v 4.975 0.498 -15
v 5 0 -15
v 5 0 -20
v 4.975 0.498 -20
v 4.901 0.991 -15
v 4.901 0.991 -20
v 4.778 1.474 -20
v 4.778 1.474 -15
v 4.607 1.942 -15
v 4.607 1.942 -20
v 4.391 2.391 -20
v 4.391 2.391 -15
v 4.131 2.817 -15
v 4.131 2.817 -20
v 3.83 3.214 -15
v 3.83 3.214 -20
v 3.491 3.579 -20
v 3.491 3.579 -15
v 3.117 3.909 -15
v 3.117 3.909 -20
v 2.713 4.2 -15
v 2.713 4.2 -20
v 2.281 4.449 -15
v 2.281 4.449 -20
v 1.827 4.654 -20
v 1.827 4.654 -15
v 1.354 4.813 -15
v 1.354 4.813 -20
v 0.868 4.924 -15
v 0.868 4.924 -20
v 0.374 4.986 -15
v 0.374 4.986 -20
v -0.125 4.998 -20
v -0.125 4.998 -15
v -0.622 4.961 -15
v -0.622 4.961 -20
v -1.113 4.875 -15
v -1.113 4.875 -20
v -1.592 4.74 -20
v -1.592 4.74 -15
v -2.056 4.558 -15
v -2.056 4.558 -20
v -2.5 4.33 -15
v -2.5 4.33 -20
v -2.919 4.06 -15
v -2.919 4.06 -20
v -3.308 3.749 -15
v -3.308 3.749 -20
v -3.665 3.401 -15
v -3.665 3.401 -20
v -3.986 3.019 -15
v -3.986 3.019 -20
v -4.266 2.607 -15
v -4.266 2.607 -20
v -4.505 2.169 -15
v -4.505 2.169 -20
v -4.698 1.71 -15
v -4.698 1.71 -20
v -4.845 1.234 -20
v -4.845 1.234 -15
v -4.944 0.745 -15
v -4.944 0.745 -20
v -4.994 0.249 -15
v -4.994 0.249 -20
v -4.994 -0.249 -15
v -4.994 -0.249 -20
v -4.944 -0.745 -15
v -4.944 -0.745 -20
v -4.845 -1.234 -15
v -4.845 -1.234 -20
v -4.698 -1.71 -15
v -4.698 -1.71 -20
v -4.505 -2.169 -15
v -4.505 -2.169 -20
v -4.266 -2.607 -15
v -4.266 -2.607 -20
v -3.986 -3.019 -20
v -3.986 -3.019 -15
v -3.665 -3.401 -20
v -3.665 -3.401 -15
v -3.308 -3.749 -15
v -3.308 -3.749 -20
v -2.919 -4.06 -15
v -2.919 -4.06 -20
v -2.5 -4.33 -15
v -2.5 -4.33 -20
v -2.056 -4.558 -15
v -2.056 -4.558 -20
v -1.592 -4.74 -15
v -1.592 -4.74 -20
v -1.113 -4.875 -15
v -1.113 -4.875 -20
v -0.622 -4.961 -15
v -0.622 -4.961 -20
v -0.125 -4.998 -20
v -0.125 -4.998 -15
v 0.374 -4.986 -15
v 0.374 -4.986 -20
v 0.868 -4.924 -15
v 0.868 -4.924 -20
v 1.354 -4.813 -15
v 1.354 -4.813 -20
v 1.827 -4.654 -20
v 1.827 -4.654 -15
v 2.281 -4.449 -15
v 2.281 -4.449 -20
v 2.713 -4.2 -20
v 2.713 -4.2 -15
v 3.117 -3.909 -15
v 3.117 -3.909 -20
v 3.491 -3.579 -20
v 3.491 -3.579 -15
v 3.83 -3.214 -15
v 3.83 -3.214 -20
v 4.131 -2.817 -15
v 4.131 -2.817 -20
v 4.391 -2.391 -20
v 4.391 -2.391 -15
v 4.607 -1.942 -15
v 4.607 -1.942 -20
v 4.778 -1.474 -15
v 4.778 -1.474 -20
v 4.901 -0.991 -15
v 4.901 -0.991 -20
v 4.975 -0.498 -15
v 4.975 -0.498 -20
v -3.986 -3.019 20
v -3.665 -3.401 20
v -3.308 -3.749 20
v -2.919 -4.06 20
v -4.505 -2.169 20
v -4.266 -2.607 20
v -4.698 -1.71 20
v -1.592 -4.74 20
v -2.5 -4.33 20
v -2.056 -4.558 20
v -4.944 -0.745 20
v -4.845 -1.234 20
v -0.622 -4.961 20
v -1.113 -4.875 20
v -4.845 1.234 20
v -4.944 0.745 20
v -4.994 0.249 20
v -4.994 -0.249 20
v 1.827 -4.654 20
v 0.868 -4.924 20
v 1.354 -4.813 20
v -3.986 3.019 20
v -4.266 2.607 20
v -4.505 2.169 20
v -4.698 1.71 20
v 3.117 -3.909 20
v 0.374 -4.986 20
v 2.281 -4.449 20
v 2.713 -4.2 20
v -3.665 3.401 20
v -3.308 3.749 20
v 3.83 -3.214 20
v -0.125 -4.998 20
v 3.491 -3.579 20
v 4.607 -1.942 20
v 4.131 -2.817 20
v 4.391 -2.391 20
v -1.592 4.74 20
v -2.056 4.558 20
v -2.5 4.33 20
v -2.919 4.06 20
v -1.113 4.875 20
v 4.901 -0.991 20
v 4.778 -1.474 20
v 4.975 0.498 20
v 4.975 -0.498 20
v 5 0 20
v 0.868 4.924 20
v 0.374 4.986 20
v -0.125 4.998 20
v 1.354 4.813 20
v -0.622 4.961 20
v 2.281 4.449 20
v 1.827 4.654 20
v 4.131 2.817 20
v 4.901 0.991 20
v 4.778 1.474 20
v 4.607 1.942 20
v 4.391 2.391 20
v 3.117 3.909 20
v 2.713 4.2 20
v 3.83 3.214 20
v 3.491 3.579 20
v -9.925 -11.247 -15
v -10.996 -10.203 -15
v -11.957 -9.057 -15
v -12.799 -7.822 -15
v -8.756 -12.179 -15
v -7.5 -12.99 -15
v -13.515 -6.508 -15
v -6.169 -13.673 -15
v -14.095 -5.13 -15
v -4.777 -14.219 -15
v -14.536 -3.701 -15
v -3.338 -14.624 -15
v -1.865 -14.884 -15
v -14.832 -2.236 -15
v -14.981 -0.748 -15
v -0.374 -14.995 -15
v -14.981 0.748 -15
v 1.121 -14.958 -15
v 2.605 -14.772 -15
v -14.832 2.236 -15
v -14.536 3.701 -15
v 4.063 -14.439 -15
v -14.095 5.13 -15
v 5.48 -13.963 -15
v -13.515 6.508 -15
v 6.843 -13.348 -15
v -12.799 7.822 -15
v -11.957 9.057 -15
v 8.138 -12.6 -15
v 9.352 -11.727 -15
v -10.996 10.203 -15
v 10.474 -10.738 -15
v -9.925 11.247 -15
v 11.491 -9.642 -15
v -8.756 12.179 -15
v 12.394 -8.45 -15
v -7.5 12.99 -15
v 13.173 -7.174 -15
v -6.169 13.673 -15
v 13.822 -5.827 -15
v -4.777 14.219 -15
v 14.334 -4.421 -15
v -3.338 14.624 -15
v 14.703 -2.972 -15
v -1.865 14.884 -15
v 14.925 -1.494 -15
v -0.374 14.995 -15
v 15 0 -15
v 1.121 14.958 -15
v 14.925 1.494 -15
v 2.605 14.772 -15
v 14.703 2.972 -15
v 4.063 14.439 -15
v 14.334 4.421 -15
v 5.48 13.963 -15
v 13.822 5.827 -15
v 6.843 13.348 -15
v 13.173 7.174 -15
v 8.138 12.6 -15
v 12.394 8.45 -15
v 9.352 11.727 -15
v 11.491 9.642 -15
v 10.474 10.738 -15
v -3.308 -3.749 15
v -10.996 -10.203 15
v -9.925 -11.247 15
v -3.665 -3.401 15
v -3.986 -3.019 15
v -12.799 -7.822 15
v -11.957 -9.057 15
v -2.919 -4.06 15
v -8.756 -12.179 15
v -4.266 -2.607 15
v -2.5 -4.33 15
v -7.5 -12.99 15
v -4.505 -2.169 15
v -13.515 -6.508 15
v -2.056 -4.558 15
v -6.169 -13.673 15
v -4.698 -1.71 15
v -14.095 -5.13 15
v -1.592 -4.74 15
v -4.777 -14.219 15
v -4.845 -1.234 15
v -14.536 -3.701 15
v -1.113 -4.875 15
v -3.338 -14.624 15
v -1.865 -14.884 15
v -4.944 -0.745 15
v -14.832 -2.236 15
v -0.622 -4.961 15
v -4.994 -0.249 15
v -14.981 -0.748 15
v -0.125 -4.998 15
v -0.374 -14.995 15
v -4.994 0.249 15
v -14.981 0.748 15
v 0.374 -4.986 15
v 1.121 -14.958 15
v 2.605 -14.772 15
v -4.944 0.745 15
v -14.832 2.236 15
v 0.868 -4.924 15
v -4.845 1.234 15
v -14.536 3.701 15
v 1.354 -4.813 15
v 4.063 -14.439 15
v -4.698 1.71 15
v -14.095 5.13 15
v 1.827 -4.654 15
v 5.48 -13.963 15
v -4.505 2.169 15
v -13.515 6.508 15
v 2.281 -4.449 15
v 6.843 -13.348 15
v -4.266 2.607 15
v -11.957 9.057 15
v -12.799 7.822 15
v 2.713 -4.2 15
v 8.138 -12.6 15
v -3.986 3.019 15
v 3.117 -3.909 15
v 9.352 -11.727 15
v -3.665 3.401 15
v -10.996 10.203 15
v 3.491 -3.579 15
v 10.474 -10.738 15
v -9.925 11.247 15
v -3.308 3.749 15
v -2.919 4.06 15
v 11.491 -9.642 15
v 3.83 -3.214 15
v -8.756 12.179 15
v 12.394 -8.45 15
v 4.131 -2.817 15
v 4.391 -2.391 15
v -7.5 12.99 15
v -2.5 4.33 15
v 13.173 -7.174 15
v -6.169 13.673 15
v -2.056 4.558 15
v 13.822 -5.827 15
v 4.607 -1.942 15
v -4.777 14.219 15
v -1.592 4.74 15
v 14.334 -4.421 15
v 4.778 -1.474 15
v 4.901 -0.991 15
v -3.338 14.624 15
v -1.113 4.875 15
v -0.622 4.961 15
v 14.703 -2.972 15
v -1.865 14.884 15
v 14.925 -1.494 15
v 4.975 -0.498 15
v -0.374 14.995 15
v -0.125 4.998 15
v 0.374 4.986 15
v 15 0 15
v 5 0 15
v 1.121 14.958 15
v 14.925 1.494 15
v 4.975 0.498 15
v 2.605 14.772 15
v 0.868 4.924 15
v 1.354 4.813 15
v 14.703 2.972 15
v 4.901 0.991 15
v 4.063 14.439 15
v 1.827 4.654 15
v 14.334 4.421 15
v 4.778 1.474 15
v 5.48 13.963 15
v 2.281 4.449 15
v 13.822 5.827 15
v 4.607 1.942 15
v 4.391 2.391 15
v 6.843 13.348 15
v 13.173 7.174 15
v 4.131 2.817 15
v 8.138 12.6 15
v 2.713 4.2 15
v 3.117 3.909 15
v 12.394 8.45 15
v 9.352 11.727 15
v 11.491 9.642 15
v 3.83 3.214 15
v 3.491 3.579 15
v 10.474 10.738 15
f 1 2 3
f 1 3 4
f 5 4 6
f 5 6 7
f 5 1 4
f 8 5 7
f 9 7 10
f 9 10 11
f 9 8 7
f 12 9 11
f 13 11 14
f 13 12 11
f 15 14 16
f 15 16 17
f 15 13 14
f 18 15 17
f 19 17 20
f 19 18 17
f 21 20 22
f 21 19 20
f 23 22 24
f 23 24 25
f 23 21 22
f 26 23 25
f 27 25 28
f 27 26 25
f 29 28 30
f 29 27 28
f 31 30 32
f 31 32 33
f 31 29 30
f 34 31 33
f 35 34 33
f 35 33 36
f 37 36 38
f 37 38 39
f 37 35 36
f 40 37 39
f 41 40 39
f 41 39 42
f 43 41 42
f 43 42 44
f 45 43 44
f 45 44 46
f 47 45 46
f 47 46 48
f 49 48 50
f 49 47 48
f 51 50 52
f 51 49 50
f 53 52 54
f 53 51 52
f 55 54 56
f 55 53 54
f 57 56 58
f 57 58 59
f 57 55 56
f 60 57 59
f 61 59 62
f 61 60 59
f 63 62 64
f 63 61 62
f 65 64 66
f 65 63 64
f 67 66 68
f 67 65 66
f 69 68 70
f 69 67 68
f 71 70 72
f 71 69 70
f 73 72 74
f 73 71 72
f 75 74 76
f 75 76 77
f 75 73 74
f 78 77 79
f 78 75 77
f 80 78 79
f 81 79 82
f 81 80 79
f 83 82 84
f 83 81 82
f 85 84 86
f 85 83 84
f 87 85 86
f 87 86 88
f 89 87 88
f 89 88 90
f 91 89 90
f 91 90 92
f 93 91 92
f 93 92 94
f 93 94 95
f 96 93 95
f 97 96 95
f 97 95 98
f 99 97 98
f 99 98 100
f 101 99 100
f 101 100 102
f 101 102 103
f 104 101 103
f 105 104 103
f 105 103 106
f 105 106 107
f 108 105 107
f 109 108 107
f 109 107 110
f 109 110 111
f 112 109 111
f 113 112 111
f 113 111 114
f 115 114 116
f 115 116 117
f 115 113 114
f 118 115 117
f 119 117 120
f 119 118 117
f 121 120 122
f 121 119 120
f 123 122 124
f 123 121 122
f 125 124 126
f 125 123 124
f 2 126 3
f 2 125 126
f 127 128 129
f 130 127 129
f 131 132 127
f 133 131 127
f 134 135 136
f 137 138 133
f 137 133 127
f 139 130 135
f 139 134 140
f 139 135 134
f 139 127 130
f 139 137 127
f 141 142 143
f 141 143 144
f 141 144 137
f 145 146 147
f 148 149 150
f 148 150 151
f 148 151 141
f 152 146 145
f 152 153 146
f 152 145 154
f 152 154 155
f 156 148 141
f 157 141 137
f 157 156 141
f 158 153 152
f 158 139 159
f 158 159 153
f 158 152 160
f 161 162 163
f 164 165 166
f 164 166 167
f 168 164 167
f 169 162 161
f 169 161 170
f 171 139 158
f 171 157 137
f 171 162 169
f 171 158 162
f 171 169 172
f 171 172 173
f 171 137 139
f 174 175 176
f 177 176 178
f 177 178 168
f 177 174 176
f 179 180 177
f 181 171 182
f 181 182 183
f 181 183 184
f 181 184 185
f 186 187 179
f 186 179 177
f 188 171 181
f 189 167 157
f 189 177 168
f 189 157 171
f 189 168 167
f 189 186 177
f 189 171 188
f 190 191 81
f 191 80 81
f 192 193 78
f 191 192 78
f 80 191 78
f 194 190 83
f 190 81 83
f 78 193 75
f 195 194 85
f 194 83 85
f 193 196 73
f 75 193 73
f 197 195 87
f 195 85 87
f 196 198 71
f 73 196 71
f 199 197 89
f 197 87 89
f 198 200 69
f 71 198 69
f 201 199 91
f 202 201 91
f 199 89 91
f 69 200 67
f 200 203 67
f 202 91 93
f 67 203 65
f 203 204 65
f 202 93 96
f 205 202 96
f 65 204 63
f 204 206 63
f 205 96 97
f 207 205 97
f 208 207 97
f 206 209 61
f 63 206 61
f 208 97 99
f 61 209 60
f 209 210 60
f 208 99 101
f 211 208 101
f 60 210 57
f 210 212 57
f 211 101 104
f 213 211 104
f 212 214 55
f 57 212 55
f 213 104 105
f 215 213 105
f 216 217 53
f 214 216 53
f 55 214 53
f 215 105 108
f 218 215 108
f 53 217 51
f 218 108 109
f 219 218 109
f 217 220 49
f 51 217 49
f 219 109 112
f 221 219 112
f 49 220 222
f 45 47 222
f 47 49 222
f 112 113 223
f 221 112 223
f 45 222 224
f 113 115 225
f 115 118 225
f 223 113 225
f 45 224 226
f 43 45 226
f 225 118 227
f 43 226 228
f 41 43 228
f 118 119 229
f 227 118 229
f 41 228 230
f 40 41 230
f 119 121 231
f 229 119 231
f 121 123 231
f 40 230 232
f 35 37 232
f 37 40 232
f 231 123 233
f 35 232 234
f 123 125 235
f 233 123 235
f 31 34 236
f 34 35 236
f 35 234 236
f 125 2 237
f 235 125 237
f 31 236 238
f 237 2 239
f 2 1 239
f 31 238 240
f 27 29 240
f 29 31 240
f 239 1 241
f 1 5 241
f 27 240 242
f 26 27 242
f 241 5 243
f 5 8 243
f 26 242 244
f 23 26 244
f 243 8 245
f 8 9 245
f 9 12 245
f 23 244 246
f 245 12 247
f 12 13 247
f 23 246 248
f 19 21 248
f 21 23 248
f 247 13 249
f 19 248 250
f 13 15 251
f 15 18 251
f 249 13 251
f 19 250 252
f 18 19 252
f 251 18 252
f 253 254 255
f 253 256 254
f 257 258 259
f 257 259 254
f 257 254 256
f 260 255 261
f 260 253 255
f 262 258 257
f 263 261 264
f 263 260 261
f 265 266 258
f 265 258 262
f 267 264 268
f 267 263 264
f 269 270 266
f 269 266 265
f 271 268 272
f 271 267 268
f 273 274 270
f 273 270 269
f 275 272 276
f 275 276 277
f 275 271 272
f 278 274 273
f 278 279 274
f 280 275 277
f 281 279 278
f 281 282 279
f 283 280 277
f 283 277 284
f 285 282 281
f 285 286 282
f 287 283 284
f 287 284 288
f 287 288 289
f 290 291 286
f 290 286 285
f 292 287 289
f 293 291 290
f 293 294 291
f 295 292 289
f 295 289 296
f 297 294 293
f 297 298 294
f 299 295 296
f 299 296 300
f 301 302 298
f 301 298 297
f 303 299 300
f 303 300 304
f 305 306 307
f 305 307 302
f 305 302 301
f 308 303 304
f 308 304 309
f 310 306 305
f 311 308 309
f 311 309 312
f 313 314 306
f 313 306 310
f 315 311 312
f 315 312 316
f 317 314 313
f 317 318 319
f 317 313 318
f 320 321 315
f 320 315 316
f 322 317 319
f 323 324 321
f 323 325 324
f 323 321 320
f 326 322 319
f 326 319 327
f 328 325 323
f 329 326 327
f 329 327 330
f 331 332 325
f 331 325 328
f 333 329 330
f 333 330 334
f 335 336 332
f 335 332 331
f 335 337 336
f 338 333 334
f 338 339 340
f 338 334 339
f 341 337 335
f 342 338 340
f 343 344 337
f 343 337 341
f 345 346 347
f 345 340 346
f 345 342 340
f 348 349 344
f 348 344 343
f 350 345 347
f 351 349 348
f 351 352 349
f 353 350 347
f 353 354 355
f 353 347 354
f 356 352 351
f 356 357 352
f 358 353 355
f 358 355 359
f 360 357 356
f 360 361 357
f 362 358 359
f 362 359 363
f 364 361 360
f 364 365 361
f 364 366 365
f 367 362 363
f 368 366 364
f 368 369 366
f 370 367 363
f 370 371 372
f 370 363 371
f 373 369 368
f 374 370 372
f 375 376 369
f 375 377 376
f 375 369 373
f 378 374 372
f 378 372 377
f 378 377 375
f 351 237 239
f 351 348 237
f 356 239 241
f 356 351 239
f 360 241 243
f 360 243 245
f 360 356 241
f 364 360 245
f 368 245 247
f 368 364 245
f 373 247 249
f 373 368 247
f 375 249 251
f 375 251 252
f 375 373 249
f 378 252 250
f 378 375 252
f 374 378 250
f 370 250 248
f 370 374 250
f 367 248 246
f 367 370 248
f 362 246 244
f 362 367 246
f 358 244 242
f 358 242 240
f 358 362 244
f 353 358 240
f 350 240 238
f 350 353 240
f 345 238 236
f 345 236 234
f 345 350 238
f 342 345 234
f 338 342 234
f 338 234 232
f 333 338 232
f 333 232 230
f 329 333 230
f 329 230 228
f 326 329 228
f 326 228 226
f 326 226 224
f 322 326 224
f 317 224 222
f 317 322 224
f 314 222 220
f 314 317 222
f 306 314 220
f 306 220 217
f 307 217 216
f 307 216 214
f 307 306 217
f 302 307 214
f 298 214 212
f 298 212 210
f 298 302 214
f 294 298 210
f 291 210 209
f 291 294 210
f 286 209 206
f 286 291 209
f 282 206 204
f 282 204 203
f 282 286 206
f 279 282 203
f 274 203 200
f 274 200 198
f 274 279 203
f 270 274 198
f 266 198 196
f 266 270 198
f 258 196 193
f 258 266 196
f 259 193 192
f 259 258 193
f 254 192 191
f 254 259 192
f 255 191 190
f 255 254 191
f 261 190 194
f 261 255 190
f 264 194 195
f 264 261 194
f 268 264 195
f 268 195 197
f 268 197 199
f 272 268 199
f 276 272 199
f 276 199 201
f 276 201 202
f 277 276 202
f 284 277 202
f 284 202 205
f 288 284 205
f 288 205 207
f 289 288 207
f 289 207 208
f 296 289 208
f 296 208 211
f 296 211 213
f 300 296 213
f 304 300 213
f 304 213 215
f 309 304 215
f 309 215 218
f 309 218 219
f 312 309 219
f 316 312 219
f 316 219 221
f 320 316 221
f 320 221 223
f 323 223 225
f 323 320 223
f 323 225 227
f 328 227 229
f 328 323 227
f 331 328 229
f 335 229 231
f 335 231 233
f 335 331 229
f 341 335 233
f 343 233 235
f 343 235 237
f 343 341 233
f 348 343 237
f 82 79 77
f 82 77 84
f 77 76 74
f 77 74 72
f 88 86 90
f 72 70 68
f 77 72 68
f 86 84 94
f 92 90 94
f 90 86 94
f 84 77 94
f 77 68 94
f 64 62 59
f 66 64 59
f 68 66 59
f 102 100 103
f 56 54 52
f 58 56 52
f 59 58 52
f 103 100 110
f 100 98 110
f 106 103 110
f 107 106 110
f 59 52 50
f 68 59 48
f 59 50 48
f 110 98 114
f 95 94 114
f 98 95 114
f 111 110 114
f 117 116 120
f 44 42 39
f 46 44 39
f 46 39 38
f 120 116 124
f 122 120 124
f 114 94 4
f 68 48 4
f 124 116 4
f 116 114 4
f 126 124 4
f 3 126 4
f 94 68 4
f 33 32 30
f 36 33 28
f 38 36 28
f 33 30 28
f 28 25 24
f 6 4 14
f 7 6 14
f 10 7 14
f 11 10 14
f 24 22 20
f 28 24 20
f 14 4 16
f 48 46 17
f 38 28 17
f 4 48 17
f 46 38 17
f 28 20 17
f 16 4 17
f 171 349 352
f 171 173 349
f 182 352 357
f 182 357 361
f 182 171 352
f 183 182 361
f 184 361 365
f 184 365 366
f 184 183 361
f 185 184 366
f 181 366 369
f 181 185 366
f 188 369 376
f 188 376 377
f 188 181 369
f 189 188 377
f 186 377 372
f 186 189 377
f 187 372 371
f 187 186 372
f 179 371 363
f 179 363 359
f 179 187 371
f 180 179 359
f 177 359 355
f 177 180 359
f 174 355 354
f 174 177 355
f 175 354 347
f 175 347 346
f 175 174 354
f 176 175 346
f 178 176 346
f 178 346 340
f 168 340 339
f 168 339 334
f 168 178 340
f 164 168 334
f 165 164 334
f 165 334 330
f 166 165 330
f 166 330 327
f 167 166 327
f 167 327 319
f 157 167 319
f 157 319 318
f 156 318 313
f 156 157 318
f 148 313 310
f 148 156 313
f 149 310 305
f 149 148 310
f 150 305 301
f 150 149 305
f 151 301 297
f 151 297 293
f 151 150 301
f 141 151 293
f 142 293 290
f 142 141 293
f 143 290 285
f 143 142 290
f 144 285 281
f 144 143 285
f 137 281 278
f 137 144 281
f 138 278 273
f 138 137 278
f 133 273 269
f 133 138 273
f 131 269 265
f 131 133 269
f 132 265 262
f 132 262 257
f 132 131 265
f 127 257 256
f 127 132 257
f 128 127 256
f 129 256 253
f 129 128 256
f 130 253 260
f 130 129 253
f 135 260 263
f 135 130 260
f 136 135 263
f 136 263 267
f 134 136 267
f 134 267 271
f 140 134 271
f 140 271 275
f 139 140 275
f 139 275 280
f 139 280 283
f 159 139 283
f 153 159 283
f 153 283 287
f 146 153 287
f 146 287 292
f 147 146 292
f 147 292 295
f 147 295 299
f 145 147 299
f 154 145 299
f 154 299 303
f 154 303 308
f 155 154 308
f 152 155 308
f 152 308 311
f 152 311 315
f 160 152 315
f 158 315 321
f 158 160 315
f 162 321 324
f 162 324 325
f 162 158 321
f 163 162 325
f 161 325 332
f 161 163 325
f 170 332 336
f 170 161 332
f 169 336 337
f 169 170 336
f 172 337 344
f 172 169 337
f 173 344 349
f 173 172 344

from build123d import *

# Parameters (mm, degrees)
SKETCH_R     = 15
PAD_DEPTH    = 15
SKETCH002_R  = 5
PAD001_DEPTH = 20


with BuildPart() as part:
    # Sketch → Pad (new body, symmetric)
    with BuildSketch(Plane.XY):
        Circle(SKETCH_R)
    extrude(amount=PAD_DEPTH, both=True)

    # Sketch002 → Pad001 (join, symmetric)
    with BuildSketch(Plane.XY):
        Circle(SKETCH002_R)
    extrude(amount=PAD001_DEPTH, both=True)


solid = part.part
